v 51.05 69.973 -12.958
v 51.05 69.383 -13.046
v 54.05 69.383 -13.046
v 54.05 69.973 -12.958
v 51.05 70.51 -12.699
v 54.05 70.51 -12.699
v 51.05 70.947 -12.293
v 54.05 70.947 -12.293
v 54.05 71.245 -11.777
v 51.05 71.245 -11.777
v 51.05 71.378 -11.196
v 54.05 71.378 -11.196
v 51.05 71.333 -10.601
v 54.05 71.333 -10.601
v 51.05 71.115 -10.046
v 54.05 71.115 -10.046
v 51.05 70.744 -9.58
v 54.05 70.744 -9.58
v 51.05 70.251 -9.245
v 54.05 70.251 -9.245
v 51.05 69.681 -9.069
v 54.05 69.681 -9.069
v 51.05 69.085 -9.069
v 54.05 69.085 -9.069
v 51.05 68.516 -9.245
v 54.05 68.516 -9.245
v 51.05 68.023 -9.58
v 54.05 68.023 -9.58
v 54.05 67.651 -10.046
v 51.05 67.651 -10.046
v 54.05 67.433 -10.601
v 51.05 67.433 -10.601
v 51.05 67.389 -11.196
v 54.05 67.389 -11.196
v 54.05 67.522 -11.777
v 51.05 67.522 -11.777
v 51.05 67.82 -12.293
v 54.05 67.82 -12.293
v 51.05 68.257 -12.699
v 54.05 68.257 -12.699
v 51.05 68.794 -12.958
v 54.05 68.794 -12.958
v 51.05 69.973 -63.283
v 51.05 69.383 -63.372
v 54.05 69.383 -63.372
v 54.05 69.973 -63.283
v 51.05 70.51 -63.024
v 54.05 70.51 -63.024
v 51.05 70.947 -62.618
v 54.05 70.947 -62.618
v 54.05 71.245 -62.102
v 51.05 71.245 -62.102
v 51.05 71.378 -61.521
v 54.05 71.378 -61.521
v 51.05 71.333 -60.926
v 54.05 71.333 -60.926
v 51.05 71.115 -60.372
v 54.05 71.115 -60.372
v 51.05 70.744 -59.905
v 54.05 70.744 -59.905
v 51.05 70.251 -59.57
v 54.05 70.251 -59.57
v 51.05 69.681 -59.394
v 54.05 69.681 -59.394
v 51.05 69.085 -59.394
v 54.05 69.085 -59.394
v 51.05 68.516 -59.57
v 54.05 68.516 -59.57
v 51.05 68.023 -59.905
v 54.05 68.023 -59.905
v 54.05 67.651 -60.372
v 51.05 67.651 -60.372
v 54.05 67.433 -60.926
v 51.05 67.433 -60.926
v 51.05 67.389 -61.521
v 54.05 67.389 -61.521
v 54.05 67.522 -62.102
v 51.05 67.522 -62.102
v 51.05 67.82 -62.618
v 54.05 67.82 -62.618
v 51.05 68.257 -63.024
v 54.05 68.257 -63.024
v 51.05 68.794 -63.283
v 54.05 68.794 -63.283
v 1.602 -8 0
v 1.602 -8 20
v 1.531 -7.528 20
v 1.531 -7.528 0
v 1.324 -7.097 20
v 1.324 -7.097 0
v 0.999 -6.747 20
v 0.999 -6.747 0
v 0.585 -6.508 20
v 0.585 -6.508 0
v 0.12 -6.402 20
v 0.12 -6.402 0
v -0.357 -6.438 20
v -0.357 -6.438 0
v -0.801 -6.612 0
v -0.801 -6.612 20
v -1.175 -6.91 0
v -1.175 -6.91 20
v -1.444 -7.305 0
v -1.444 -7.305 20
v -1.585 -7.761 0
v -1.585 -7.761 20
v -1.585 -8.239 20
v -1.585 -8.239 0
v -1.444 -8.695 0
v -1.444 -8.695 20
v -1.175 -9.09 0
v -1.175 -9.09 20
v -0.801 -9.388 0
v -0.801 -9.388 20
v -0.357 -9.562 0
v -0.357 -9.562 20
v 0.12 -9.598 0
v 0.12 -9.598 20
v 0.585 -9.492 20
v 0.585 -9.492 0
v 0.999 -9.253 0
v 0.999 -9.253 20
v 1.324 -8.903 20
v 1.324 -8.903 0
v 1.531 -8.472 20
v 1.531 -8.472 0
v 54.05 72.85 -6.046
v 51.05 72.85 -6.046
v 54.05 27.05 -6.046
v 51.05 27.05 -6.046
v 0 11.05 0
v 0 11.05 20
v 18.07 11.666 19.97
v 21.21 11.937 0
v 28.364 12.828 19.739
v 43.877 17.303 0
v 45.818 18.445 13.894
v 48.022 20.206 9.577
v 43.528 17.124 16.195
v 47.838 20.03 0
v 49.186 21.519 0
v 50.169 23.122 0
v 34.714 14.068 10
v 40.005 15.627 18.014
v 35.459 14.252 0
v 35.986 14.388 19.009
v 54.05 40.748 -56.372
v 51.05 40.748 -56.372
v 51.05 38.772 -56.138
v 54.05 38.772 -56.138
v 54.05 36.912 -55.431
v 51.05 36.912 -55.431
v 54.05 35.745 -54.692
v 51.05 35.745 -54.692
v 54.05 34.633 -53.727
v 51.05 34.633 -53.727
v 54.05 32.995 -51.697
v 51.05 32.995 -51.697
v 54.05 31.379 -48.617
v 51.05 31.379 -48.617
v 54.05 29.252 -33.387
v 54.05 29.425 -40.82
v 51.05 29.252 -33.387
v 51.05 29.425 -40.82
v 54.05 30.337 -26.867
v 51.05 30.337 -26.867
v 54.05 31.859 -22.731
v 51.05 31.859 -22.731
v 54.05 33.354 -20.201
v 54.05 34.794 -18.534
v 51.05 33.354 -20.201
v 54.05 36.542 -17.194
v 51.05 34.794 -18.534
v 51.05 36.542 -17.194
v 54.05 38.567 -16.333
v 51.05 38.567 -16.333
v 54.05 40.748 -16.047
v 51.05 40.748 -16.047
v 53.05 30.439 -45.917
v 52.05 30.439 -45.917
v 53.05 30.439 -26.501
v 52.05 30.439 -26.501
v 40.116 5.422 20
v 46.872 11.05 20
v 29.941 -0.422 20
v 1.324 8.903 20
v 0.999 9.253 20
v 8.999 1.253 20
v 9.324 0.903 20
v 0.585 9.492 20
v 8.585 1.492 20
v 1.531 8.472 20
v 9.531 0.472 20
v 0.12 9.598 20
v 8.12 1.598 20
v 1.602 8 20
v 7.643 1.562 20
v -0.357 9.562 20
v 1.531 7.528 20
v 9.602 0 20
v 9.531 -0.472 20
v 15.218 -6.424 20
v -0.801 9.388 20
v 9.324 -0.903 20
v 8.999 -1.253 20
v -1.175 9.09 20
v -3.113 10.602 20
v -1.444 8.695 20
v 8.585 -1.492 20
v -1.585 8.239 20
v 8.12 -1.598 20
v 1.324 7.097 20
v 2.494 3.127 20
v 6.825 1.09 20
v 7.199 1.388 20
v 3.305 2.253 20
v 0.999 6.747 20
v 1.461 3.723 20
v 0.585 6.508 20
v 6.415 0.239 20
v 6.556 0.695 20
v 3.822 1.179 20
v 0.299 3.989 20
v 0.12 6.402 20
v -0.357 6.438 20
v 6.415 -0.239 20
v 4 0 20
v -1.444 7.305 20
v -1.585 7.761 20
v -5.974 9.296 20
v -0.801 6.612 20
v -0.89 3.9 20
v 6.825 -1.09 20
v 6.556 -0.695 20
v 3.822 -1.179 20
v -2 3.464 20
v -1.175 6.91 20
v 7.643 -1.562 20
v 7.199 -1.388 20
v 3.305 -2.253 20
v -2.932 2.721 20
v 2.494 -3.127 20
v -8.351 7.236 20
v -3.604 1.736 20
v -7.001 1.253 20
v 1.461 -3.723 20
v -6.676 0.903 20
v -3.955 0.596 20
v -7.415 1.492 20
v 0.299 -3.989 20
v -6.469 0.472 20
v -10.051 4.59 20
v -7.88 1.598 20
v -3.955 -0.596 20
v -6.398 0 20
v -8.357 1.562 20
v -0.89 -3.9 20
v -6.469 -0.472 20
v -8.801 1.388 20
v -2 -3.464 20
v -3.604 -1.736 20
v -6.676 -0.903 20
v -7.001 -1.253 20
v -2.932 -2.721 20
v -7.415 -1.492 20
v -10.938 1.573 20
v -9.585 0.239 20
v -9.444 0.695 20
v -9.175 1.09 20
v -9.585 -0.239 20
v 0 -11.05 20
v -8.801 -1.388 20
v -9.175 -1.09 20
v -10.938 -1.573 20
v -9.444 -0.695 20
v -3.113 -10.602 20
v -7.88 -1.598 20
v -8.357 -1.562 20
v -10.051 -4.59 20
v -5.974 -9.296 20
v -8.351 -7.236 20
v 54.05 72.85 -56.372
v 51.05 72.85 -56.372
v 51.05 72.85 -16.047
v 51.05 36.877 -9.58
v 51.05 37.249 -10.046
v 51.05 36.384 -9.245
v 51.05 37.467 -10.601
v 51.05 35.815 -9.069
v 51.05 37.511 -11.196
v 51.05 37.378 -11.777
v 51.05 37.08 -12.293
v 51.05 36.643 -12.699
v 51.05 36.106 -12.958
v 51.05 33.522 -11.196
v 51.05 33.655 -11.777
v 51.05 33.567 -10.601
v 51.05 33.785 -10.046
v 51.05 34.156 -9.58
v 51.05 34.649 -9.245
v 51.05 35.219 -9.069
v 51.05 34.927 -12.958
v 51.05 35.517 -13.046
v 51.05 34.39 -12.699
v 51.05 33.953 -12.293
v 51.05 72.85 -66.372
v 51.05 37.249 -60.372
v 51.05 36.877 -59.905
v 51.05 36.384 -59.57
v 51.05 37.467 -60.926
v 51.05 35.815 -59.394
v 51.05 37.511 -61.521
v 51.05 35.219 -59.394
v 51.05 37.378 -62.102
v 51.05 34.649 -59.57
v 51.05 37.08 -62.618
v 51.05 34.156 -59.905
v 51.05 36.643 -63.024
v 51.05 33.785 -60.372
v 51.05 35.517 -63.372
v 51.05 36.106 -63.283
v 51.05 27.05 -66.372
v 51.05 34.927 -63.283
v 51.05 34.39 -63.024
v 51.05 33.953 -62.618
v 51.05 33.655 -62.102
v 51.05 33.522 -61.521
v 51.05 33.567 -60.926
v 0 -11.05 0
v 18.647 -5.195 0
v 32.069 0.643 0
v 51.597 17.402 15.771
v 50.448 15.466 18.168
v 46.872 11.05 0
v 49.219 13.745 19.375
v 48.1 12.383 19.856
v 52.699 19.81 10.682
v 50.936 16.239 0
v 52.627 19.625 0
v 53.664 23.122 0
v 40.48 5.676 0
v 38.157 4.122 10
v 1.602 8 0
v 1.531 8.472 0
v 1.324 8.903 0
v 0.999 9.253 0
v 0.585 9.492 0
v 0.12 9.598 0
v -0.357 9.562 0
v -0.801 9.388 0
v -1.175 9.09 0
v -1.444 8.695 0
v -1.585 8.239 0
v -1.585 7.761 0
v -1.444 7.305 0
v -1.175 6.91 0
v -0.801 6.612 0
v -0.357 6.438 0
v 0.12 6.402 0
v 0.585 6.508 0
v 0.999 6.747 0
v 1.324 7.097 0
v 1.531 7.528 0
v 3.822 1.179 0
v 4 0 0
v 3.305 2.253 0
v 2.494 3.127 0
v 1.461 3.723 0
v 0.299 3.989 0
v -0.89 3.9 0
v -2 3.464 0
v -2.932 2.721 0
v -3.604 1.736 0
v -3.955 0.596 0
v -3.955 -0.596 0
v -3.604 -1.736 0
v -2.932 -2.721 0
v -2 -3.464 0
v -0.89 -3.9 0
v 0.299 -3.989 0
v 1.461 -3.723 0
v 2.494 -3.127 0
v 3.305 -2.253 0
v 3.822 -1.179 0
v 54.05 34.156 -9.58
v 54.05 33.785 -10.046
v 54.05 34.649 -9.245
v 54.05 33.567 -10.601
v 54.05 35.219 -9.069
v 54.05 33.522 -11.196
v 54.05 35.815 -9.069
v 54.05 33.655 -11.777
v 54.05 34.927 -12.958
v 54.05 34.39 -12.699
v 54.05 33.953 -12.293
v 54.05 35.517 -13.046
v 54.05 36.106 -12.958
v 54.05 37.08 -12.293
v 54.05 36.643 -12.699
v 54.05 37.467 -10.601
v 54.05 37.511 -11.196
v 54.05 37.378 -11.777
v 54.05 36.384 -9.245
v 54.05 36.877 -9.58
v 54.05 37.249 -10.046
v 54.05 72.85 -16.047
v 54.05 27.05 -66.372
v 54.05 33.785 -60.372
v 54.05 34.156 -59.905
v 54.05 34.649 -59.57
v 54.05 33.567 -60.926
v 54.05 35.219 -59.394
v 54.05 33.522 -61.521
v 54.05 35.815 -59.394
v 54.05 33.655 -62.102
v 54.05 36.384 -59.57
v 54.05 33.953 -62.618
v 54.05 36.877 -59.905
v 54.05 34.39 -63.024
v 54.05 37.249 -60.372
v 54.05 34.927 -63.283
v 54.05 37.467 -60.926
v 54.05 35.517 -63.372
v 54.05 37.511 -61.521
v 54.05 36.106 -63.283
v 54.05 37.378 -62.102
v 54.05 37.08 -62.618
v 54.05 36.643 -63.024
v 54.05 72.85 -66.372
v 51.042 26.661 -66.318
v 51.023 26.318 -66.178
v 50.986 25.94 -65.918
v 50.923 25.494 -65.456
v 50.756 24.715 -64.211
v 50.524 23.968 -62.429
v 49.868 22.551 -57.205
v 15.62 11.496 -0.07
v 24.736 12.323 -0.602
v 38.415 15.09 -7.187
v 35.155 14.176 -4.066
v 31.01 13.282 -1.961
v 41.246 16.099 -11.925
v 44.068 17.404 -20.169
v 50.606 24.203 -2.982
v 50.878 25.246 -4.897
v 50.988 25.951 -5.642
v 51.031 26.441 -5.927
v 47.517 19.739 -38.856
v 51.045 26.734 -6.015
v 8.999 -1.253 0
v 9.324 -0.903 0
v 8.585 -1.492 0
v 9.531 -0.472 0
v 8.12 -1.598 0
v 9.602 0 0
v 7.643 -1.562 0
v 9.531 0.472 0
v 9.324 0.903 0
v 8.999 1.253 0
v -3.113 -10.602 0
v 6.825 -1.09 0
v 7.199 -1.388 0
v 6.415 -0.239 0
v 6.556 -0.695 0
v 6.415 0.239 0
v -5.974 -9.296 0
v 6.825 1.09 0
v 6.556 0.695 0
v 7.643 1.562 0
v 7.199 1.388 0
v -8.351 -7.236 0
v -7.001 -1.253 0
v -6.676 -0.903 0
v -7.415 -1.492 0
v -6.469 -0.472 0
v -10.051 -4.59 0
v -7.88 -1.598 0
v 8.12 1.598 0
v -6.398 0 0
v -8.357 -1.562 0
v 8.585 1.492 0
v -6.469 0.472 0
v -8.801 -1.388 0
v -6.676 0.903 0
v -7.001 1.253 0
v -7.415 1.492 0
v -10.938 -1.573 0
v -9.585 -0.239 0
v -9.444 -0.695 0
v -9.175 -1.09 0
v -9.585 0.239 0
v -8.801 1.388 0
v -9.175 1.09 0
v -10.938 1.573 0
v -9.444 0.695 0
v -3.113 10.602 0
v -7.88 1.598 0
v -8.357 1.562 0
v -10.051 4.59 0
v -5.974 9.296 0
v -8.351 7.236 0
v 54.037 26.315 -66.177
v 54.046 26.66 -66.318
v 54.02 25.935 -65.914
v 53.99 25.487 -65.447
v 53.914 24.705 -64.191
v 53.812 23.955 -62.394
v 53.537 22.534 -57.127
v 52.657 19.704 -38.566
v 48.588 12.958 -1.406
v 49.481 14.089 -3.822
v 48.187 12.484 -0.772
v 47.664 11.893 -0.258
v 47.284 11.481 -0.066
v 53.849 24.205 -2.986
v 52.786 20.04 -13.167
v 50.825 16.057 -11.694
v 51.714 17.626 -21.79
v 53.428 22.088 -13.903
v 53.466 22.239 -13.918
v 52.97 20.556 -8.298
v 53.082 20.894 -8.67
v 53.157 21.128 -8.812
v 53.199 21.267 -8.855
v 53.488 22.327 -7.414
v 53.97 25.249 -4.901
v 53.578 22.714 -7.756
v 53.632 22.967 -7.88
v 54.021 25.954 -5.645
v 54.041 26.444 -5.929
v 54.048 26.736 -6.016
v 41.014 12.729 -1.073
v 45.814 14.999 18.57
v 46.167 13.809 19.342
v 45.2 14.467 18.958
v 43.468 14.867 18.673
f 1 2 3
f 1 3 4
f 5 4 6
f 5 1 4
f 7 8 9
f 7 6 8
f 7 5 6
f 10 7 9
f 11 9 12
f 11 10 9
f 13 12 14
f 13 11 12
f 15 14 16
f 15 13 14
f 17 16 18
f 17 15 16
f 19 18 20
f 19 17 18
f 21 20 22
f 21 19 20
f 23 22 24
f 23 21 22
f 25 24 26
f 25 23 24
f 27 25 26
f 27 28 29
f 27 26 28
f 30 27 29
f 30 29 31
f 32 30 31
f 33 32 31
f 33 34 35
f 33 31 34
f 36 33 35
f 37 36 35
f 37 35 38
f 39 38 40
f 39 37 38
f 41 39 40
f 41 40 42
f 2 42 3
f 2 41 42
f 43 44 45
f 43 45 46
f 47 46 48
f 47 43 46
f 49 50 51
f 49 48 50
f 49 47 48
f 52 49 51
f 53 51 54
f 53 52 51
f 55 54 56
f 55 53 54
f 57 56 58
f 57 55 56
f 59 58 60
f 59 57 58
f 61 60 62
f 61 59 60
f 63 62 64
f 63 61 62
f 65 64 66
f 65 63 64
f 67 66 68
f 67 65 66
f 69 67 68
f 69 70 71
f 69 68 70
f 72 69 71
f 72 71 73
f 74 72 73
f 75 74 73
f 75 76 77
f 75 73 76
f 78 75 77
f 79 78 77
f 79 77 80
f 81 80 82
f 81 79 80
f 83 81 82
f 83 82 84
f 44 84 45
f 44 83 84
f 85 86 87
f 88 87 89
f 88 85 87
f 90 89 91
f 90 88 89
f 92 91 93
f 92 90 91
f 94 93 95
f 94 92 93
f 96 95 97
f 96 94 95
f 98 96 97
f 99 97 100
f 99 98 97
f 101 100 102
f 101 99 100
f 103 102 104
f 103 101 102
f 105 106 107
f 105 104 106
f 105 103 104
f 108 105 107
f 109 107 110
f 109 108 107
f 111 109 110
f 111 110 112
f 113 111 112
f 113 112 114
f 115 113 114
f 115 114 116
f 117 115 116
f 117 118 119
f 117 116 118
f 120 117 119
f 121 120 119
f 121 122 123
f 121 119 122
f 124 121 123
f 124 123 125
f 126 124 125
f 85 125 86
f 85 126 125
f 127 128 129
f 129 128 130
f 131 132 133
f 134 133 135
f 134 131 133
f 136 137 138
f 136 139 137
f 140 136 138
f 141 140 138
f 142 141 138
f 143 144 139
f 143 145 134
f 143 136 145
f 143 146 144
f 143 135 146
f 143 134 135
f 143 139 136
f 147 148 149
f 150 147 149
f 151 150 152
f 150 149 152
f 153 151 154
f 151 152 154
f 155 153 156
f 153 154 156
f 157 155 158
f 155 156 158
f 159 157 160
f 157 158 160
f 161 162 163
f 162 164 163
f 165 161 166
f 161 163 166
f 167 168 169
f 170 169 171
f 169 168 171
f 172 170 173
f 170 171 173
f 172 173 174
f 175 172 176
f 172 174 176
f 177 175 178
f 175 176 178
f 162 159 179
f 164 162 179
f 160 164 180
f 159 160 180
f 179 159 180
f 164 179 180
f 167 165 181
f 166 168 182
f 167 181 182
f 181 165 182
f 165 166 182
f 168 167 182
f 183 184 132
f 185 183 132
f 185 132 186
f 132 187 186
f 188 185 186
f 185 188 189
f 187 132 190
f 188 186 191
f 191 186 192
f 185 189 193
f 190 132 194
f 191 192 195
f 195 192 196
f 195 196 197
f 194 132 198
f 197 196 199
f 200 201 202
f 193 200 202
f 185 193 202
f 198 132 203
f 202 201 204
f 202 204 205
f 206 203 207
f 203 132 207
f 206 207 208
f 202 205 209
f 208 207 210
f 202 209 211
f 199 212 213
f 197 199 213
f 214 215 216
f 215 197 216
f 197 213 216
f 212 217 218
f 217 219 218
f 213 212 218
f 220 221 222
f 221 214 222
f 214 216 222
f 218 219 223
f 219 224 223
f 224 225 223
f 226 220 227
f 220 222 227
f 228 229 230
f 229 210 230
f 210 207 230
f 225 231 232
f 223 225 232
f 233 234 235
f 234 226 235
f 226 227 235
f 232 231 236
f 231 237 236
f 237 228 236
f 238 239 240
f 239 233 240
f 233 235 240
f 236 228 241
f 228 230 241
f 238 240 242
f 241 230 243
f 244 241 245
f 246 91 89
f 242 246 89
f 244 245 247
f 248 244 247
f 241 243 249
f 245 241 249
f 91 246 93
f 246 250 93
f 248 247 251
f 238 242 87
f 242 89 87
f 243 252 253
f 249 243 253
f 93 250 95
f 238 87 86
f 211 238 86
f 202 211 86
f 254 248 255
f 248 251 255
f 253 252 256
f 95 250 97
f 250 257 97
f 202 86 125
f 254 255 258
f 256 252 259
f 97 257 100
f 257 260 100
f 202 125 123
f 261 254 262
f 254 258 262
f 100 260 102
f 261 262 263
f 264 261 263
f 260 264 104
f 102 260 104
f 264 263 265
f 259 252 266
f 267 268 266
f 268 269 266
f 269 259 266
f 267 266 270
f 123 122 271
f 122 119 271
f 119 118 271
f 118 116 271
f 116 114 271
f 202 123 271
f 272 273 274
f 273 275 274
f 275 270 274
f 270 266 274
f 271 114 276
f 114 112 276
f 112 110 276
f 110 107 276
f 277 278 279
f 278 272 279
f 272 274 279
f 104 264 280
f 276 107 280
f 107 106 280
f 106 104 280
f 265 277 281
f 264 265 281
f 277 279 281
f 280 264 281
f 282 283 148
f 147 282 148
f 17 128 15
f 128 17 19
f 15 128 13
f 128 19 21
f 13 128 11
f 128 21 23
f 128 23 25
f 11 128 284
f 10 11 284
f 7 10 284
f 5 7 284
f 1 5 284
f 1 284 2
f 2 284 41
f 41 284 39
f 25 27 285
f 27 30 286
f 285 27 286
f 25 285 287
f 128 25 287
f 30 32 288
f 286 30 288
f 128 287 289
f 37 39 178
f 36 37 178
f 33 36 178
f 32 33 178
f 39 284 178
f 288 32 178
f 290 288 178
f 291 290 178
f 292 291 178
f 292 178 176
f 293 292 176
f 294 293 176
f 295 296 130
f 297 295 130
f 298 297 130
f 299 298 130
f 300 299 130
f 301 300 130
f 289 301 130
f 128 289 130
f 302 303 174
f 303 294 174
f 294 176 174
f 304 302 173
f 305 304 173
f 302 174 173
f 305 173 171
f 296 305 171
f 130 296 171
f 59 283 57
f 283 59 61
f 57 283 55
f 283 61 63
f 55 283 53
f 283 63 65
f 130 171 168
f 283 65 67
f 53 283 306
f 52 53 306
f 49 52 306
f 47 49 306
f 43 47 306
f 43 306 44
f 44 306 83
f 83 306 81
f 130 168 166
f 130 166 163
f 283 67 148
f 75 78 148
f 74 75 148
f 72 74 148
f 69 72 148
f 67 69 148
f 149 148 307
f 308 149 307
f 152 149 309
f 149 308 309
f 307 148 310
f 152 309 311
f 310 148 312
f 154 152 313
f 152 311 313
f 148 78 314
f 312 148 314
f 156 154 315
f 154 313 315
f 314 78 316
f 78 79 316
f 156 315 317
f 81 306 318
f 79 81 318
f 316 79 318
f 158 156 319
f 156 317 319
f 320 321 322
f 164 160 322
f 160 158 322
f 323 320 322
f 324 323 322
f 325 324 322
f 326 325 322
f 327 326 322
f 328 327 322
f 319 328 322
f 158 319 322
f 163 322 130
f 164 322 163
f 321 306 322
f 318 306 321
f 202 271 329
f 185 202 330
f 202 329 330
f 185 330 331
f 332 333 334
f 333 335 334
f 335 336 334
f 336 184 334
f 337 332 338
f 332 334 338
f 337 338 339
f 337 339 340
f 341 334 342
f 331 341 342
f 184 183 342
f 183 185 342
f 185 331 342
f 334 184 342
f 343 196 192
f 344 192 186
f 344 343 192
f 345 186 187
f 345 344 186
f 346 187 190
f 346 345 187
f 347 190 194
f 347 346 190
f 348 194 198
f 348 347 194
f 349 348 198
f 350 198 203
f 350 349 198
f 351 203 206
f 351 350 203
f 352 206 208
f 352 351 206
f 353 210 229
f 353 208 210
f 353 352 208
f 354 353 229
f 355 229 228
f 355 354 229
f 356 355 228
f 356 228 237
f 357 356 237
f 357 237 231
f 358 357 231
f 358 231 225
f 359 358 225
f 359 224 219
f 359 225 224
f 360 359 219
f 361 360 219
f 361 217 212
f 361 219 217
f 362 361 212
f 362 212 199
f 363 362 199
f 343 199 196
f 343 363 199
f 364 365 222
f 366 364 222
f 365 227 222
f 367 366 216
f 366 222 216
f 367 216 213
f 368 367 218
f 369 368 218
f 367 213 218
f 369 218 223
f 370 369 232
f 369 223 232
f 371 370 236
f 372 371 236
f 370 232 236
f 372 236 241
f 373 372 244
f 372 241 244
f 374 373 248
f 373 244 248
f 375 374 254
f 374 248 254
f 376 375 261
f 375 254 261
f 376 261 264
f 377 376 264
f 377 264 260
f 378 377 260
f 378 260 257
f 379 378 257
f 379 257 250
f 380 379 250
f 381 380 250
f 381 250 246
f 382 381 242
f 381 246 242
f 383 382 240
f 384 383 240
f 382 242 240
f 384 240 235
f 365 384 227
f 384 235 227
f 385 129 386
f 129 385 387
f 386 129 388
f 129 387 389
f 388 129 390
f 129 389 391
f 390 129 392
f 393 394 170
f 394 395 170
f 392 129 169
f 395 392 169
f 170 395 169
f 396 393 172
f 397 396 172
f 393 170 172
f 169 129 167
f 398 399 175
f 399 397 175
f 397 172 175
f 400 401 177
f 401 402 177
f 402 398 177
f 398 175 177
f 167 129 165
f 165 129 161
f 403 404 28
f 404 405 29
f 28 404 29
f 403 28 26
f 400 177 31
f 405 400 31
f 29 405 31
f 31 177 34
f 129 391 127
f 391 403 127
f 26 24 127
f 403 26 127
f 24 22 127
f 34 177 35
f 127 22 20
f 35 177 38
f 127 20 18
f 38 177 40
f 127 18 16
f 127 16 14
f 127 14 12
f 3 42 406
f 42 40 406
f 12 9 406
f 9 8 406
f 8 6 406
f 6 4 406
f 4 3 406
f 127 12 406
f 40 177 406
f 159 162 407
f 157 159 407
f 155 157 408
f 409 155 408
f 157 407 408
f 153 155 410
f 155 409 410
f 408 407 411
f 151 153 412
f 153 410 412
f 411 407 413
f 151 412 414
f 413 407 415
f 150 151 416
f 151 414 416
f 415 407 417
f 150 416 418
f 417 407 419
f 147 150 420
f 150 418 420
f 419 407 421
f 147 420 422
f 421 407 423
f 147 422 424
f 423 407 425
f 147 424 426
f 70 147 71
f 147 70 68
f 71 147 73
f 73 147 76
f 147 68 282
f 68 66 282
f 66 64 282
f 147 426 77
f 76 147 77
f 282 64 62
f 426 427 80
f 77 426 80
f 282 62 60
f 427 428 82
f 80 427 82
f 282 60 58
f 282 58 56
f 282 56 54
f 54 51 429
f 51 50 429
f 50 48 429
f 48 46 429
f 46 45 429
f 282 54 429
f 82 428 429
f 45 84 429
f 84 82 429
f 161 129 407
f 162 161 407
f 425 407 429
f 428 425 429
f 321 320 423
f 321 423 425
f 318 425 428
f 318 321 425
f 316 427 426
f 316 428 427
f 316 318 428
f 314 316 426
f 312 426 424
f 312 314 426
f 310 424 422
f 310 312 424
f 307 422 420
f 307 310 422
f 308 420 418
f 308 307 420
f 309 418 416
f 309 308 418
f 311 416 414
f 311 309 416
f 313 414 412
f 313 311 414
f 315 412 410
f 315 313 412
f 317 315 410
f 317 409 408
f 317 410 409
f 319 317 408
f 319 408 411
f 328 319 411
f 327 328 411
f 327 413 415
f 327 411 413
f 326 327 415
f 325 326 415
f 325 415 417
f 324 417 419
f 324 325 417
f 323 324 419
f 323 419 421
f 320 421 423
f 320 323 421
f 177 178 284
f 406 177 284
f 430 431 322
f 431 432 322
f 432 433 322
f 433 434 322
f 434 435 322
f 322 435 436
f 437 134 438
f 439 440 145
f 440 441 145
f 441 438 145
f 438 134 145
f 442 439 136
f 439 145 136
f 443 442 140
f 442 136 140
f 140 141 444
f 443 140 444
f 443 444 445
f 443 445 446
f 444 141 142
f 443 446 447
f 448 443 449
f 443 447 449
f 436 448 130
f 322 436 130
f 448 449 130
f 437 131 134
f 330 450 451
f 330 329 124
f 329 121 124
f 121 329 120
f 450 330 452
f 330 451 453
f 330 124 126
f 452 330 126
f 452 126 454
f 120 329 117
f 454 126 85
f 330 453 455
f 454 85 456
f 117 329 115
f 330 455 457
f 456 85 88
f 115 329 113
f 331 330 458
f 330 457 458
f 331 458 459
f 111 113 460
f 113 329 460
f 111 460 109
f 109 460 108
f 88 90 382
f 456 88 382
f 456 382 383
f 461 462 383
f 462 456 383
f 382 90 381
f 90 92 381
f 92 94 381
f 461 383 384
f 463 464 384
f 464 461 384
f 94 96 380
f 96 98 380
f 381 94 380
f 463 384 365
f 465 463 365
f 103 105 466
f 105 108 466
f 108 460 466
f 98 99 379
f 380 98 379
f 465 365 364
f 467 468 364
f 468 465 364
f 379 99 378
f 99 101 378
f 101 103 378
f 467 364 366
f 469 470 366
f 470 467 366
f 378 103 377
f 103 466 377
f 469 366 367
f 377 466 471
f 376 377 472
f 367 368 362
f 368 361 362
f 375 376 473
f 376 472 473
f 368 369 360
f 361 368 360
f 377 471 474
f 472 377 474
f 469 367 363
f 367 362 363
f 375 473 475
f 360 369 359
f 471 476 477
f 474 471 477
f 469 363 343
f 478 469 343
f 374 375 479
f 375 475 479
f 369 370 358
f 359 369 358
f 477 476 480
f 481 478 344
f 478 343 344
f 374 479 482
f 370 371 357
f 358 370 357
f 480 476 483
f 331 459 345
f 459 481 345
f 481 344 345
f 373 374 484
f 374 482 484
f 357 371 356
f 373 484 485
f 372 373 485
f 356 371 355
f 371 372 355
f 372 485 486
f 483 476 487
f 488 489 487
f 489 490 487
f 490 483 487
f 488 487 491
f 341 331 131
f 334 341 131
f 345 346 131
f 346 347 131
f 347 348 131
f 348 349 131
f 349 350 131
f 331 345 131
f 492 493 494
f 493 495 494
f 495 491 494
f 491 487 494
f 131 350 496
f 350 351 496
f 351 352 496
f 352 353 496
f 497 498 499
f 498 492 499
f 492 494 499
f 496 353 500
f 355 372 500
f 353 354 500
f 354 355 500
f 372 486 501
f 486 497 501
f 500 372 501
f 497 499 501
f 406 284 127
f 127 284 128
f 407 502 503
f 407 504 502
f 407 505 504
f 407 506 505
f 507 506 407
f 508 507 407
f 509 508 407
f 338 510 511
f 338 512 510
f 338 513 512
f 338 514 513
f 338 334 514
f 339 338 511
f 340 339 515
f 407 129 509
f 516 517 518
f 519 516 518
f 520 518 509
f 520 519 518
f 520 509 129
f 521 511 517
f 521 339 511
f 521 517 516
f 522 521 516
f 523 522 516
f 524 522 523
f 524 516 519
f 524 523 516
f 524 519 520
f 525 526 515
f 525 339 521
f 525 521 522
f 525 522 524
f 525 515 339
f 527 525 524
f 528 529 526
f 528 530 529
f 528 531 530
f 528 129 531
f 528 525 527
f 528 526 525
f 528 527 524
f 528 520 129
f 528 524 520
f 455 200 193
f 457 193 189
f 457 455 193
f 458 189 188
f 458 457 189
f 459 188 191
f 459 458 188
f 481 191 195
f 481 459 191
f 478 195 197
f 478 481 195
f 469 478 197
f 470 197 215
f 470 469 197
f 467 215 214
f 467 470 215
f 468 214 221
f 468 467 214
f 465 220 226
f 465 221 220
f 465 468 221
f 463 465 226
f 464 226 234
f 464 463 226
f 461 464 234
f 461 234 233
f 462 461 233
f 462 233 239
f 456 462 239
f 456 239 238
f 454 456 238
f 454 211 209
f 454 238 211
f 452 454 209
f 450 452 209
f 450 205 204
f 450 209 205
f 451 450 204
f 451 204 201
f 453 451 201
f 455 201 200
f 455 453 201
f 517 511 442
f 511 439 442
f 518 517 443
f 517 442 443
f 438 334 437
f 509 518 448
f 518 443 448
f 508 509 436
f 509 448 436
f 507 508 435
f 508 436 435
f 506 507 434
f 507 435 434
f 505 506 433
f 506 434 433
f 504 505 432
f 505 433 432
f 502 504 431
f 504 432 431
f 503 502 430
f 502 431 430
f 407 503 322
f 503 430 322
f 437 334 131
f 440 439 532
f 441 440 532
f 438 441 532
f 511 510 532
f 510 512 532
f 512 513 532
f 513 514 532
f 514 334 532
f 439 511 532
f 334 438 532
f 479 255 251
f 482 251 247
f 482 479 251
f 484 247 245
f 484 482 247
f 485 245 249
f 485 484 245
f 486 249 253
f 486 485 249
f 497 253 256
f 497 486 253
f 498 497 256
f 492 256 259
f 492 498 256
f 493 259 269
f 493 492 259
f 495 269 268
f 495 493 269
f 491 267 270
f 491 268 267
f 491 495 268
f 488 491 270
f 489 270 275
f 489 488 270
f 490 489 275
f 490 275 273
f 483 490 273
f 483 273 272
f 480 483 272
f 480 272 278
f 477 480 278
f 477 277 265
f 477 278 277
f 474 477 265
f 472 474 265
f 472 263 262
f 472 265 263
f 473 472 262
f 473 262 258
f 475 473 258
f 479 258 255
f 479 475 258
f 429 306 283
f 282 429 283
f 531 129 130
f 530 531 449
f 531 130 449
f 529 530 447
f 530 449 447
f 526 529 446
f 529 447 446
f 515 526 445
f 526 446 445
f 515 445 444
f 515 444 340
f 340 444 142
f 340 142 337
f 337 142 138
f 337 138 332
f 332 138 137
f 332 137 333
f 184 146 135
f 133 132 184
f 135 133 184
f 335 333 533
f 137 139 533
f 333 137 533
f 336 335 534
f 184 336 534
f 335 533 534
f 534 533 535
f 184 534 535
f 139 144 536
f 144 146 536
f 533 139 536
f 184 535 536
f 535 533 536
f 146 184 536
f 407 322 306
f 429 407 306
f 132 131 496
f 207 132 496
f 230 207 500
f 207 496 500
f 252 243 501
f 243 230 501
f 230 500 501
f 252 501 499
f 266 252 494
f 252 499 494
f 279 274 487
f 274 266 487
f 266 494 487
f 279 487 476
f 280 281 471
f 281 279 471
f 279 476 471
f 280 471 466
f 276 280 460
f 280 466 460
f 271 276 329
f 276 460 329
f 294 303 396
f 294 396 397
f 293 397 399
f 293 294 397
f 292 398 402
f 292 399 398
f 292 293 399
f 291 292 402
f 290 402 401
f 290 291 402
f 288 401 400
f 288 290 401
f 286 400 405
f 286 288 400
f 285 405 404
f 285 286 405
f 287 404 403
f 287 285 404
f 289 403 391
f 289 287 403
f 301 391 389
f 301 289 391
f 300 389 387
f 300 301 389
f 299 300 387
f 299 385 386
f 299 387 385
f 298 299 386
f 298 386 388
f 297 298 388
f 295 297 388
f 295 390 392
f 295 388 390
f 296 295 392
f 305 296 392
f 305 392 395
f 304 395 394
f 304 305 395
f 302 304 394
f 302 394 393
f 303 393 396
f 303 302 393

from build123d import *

# Parameters (mm, degrees)
BOSS_EXTRUDE1_START     = -60.5
BOSS_EXTRUDE1_OUTLINE_R = 2
BOSS_EXTRUDE1_DEPTH     = 121
SKETCH1_W               = 179.187175662
SKETCH1_H               = 206.234296517
SKETCH1_R               = 1.6025
SKETCH1_R_2             = 4
CUT_EXTRUDE1_DEPTH      = 80


# Read off the part's stored shape, not the designer's step: Boss-Extrude1
with BuildPart() as part:
    # Boss-Extrude1 outline → Boss-Extrude1 (new body)
    with BuildSketch(Plane(origin=(0, 0, 0), x_dir=(0, 0, -1), z_dir=(1, 0, 0)).offset(BOSS_EXTRUDE1_START)):
        with BuildLine():
            Line((6.0465, 72.85), (6.0465, 27.05))
            add(Edge.make_bspline(
                [(6.0465, 27.05), (6.0465, 21.716666667), (-20, 21.716666667), (-20, 11.05)],
                knots=[0, 0, 0, 0, 1, 1, 1, 1], degree=3))
            Line((-20, 11.05), (-20, -11.05))
            Line((-20, -11.05), (0, -11.05))
            Line((0, -11.05), (0, 11.05))
            add(Edge.make_bspline(
                [(0, 11.05), (0, 19.05), (66.3715, 19.05), (66.3715, 27.05)],
                knots=[0, 0, 0, 0, 1, 1, 1, 1], degree=3))
            Line((66.3715, 27.05), (66.3715, 72.85))
            Line((66.3715, 72.85), (56.3715, 72.85))
            Line((56.3715, 72.85), (56.3715, 40.748146134))
            add(Edge.make_bspline(
                [(56.3715, 40.748146134), (56.3715, 25.284890874), (16.0465, 25.284890874), (16.0465, 40.748146134)],
                knots=[0, 0, 0, 0, 1, 1, 1, 1], degree=3))
            Line((16.0465, 40.748146134), (16.0465, 72.85))
            Line((16.0465, 72.85), (6.0465, 72.85))
        make_face()
        with Locations((11.0465, 35.516666667)):
            Circle(BOSS_EXTRUDE1_OUTLINE_R, mode=Mode.SUBTRACT)
        with Locations((11.0465, 69.383333333)):
            Circle(BOSS_EXTRUDE1_OUTLINE_R, mode=Mode.SUBTRACT)
        with Locations((61.3715, 35.516666667)):
            Circle(BOSS_EXTRUDE1_OUTLINE_R, mode=Mode.SUBTRACT)
        with Locations((61.3715, 69.383333333)):
            Circle(BOSS_EXTRUDE1_OUTLINE_R, mode=Mode.SUBTRACT)
    extrude(amount=BOSS_EXTRUDE1_DEPTH)

    # Sketch1 → Cut-Extrude1 (cut, symmetric)
    # profile 1 of 6: a face of its own
    with BuildSketch(Plane.XY):
        with Locations((-22.097828966, 29.224383364)):
            Rectangle(SKETCH1_W, SKETCH1_H)
        with BuildLine():
            add(Edge.make_bspline(
                [(0, -11.05), (54.05, 3.432653851), (54.05, 27.05)],
                knots=[0, 0, 0, 1, 1, 1], degree=2))
            Line((54.05, 27.05), (54.05, 72.85))
            Line((54.05, 72.85), (51.05, 72.85))
            Line((51.05, 72.85), (51.05, 27.05))
            add(Edge.make_bspline(
                [(0, 11.05), (51.05, 11.05), (51.05, 27.05)],
                knots=[0, 0, 0, 1, 1, 1], degree=2))
            ThreePointArc((0, 11.05), (-11.05, 0), (0, -11.05))
        make_face(mode=Mode.SUBTRACT)
    # profile 2 of 6: a face of its own
    with BuildSketch(Plane.XY):
        with Locations((8, 0)):
            Circle(SKETCH1_R)
    # profile 3 of 6: a face of its own
    with BuildSketch(Plane.XY):
        with Locations((0, 8)):
            Circle(SKETCH1_R)
    # profile 4 of 6: a face of its own
    with BuildSketch(Plane.XY):
        with Locations((-8, 0)):
            Circle(SKETCH1_R)
    # profile 5 of 6: a face of its own
    with BuildSketch(Plane.XY):
        with Locations((0, -8)):
            Circle(SKETCH1_R)
    # profile 6 of 6: a face of its own
    with BuildSketch(Plane.XY):
        Circle(SKETCH1_R_2)
    extrude(amount=CUT_EXTRUDE1_DEPTH, both=True, mode=Mode.SUBTRACT)


solid = part.part
